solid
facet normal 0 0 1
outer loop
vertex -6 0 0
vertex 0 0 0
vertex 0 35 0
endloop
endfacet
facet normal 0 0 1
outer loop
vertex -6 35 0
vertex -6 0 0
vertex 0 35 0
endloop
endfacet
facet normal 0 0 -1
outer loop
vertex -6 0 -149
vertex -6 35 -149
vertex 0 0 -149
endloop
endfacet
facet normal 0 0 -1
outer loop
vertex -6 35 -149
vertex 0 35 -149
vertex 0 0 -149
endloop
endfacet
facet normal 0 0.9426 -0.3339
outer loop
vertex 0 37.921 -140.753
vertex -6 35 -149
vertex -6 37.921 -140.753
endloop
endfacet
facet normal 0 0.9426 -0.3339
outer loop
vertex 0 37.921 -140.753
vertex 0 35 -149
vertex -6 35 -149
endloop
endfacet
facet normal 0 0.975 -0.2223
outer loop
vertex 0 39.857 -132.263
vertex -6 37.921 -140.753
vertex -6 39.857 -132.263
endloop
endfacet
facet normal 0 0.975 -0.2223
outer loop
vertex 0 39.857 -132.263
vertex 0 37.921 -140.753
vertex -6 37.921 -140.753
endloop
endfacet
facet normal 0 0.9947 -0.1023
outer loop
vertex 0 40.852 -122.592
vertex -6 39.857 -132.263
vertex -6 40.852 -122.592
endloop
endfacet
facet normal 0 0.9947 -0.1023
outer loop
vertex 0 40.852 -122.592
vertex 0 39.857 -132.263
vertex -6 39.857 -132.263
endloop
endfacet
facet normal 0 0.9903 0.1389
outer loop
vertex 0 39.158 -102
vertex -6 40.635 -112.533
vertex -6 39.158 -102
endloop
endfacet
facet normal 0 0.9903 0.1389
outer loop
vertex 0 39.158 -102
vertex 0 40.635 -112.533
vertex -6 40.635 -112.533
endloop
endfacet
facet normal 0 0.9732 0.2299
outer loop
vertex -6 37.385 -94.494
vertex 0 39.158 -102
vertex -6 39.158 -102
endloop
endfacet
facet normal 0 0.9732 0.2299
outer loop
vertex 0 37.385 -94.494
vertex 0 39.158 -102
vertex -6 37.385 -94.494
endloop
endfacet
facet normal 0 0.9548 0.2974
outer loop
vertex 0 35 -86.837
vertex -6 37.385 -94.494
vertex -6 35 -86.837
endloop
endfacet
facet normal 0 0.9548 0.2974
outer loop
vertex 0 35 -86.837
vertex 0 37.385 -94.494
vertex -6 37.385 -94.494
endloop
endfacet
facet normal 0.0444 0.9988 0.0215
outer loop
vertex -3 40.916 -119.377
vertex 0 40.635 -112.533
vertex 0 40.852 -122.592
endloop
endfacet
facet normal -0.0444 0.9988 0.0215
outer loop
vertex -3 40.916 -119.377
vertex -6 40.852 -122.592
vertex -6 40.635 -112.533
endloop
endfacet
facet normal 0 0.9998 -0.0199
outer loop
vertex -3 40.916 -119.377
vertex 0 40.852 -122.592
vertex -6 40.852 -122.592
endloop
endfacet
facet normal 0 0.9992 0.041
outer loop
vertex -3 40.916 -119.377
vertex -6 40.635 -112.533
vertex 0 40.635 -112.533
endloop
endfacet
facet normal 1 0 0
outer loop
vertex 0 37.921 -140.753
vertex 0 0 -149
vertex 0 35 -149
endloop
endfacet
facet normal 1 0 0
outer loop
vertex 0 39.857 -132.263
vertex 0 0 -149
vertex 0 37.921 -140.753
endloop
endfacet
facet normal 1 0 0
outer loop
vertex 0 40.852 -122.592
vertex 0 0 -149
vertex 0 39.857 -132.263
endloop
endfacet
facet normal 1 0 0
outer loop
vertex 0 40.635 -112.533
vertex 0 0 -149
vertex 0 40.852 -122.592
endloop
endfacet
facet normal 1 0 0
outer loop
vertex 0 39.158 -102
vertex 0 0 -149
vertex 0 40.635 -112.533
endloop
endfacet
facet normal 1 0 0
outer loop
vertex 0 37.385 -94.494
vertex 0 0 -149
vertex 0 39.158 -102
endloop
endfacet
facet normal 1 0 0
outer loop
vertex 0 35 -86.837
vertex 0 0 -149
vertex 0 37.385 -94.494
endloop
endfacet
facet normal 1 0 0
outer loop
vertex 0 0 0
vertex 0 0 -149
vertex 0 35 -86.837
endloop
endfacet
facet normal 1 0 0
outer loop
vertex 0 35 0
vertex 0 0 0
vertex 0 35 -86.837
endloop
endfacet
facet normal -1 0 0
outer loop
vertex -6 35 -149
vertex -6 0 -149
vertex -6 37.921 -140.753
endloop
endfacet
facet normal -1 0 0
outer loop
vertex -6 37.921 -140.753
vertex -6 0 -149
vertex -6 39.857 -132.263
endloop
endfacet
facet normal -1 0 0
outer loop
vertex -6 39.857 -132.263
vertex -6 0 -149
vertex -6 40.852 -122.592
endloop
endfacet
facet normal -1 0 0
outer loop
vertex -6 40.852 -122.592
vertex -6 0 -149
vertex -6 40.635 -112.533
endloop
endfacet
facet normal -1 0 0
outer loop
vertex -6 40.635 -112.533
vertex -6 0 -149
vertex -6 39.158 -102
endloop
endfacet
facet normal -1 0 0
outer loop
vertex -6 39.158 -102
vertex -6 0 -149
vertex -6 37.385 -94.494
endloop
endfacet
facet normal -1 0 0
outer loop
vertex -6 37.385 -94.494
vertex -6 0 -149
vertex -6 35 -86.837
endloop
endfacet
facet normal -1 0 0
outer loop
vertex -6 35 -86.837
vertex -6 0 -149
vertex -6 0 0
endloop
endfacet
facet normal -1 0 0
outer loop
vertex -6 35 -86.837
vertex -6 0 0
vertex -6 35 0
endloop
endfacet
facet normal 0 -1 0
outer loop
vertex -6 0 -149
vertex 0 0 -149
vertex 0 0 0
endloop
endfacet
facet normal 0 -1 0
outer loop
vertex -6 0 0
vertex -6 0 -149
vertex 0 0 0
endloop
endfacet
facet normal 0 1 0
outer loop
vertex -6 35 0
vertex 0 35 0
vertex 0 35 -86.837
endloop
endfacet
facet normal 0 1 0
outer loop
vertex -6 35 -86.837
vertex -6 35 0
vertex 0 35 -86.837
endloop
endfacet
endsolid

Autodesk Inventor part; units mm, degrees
ref_plane "YZ Plane" through (0, 0, 0) normal (1, 0, 0) x (0, 1, 0)
ref_plane "XZ Plane" through (0, 0, 0) normal (0, 1, 0) x (-1, 0, 0)
ref_plane "XY Plane" through (0, 0, 0) normal (0, 0, 1) x (1, 0, 0)
sketch "Sketch1" plane through (0, 0, 0) normal (1, 0, 0) x (0, 1, 0)
  line L0 (0, 0) -> (35, 0)
  line L1 (35, 0) -> (35, -86.8367)
  line L2 (35, -149) -> (0, -149)
  line L3 (0, -149) -> (0, 0)
  spline S0 degree 2 poles (35, -149) (46.832, -120.836) (35, -86.8367) knots 0 0 0 1 1 1
  point P0 (0, -76.4686)
  point P1 (40.9046, -120.7367)
  dimension "d0" = 35
  dimension "d1" = 149
extrude "Extrusion1" add sketch "Sketch1" against normal blind 6
properties part number "Inboard Wing Brace"
